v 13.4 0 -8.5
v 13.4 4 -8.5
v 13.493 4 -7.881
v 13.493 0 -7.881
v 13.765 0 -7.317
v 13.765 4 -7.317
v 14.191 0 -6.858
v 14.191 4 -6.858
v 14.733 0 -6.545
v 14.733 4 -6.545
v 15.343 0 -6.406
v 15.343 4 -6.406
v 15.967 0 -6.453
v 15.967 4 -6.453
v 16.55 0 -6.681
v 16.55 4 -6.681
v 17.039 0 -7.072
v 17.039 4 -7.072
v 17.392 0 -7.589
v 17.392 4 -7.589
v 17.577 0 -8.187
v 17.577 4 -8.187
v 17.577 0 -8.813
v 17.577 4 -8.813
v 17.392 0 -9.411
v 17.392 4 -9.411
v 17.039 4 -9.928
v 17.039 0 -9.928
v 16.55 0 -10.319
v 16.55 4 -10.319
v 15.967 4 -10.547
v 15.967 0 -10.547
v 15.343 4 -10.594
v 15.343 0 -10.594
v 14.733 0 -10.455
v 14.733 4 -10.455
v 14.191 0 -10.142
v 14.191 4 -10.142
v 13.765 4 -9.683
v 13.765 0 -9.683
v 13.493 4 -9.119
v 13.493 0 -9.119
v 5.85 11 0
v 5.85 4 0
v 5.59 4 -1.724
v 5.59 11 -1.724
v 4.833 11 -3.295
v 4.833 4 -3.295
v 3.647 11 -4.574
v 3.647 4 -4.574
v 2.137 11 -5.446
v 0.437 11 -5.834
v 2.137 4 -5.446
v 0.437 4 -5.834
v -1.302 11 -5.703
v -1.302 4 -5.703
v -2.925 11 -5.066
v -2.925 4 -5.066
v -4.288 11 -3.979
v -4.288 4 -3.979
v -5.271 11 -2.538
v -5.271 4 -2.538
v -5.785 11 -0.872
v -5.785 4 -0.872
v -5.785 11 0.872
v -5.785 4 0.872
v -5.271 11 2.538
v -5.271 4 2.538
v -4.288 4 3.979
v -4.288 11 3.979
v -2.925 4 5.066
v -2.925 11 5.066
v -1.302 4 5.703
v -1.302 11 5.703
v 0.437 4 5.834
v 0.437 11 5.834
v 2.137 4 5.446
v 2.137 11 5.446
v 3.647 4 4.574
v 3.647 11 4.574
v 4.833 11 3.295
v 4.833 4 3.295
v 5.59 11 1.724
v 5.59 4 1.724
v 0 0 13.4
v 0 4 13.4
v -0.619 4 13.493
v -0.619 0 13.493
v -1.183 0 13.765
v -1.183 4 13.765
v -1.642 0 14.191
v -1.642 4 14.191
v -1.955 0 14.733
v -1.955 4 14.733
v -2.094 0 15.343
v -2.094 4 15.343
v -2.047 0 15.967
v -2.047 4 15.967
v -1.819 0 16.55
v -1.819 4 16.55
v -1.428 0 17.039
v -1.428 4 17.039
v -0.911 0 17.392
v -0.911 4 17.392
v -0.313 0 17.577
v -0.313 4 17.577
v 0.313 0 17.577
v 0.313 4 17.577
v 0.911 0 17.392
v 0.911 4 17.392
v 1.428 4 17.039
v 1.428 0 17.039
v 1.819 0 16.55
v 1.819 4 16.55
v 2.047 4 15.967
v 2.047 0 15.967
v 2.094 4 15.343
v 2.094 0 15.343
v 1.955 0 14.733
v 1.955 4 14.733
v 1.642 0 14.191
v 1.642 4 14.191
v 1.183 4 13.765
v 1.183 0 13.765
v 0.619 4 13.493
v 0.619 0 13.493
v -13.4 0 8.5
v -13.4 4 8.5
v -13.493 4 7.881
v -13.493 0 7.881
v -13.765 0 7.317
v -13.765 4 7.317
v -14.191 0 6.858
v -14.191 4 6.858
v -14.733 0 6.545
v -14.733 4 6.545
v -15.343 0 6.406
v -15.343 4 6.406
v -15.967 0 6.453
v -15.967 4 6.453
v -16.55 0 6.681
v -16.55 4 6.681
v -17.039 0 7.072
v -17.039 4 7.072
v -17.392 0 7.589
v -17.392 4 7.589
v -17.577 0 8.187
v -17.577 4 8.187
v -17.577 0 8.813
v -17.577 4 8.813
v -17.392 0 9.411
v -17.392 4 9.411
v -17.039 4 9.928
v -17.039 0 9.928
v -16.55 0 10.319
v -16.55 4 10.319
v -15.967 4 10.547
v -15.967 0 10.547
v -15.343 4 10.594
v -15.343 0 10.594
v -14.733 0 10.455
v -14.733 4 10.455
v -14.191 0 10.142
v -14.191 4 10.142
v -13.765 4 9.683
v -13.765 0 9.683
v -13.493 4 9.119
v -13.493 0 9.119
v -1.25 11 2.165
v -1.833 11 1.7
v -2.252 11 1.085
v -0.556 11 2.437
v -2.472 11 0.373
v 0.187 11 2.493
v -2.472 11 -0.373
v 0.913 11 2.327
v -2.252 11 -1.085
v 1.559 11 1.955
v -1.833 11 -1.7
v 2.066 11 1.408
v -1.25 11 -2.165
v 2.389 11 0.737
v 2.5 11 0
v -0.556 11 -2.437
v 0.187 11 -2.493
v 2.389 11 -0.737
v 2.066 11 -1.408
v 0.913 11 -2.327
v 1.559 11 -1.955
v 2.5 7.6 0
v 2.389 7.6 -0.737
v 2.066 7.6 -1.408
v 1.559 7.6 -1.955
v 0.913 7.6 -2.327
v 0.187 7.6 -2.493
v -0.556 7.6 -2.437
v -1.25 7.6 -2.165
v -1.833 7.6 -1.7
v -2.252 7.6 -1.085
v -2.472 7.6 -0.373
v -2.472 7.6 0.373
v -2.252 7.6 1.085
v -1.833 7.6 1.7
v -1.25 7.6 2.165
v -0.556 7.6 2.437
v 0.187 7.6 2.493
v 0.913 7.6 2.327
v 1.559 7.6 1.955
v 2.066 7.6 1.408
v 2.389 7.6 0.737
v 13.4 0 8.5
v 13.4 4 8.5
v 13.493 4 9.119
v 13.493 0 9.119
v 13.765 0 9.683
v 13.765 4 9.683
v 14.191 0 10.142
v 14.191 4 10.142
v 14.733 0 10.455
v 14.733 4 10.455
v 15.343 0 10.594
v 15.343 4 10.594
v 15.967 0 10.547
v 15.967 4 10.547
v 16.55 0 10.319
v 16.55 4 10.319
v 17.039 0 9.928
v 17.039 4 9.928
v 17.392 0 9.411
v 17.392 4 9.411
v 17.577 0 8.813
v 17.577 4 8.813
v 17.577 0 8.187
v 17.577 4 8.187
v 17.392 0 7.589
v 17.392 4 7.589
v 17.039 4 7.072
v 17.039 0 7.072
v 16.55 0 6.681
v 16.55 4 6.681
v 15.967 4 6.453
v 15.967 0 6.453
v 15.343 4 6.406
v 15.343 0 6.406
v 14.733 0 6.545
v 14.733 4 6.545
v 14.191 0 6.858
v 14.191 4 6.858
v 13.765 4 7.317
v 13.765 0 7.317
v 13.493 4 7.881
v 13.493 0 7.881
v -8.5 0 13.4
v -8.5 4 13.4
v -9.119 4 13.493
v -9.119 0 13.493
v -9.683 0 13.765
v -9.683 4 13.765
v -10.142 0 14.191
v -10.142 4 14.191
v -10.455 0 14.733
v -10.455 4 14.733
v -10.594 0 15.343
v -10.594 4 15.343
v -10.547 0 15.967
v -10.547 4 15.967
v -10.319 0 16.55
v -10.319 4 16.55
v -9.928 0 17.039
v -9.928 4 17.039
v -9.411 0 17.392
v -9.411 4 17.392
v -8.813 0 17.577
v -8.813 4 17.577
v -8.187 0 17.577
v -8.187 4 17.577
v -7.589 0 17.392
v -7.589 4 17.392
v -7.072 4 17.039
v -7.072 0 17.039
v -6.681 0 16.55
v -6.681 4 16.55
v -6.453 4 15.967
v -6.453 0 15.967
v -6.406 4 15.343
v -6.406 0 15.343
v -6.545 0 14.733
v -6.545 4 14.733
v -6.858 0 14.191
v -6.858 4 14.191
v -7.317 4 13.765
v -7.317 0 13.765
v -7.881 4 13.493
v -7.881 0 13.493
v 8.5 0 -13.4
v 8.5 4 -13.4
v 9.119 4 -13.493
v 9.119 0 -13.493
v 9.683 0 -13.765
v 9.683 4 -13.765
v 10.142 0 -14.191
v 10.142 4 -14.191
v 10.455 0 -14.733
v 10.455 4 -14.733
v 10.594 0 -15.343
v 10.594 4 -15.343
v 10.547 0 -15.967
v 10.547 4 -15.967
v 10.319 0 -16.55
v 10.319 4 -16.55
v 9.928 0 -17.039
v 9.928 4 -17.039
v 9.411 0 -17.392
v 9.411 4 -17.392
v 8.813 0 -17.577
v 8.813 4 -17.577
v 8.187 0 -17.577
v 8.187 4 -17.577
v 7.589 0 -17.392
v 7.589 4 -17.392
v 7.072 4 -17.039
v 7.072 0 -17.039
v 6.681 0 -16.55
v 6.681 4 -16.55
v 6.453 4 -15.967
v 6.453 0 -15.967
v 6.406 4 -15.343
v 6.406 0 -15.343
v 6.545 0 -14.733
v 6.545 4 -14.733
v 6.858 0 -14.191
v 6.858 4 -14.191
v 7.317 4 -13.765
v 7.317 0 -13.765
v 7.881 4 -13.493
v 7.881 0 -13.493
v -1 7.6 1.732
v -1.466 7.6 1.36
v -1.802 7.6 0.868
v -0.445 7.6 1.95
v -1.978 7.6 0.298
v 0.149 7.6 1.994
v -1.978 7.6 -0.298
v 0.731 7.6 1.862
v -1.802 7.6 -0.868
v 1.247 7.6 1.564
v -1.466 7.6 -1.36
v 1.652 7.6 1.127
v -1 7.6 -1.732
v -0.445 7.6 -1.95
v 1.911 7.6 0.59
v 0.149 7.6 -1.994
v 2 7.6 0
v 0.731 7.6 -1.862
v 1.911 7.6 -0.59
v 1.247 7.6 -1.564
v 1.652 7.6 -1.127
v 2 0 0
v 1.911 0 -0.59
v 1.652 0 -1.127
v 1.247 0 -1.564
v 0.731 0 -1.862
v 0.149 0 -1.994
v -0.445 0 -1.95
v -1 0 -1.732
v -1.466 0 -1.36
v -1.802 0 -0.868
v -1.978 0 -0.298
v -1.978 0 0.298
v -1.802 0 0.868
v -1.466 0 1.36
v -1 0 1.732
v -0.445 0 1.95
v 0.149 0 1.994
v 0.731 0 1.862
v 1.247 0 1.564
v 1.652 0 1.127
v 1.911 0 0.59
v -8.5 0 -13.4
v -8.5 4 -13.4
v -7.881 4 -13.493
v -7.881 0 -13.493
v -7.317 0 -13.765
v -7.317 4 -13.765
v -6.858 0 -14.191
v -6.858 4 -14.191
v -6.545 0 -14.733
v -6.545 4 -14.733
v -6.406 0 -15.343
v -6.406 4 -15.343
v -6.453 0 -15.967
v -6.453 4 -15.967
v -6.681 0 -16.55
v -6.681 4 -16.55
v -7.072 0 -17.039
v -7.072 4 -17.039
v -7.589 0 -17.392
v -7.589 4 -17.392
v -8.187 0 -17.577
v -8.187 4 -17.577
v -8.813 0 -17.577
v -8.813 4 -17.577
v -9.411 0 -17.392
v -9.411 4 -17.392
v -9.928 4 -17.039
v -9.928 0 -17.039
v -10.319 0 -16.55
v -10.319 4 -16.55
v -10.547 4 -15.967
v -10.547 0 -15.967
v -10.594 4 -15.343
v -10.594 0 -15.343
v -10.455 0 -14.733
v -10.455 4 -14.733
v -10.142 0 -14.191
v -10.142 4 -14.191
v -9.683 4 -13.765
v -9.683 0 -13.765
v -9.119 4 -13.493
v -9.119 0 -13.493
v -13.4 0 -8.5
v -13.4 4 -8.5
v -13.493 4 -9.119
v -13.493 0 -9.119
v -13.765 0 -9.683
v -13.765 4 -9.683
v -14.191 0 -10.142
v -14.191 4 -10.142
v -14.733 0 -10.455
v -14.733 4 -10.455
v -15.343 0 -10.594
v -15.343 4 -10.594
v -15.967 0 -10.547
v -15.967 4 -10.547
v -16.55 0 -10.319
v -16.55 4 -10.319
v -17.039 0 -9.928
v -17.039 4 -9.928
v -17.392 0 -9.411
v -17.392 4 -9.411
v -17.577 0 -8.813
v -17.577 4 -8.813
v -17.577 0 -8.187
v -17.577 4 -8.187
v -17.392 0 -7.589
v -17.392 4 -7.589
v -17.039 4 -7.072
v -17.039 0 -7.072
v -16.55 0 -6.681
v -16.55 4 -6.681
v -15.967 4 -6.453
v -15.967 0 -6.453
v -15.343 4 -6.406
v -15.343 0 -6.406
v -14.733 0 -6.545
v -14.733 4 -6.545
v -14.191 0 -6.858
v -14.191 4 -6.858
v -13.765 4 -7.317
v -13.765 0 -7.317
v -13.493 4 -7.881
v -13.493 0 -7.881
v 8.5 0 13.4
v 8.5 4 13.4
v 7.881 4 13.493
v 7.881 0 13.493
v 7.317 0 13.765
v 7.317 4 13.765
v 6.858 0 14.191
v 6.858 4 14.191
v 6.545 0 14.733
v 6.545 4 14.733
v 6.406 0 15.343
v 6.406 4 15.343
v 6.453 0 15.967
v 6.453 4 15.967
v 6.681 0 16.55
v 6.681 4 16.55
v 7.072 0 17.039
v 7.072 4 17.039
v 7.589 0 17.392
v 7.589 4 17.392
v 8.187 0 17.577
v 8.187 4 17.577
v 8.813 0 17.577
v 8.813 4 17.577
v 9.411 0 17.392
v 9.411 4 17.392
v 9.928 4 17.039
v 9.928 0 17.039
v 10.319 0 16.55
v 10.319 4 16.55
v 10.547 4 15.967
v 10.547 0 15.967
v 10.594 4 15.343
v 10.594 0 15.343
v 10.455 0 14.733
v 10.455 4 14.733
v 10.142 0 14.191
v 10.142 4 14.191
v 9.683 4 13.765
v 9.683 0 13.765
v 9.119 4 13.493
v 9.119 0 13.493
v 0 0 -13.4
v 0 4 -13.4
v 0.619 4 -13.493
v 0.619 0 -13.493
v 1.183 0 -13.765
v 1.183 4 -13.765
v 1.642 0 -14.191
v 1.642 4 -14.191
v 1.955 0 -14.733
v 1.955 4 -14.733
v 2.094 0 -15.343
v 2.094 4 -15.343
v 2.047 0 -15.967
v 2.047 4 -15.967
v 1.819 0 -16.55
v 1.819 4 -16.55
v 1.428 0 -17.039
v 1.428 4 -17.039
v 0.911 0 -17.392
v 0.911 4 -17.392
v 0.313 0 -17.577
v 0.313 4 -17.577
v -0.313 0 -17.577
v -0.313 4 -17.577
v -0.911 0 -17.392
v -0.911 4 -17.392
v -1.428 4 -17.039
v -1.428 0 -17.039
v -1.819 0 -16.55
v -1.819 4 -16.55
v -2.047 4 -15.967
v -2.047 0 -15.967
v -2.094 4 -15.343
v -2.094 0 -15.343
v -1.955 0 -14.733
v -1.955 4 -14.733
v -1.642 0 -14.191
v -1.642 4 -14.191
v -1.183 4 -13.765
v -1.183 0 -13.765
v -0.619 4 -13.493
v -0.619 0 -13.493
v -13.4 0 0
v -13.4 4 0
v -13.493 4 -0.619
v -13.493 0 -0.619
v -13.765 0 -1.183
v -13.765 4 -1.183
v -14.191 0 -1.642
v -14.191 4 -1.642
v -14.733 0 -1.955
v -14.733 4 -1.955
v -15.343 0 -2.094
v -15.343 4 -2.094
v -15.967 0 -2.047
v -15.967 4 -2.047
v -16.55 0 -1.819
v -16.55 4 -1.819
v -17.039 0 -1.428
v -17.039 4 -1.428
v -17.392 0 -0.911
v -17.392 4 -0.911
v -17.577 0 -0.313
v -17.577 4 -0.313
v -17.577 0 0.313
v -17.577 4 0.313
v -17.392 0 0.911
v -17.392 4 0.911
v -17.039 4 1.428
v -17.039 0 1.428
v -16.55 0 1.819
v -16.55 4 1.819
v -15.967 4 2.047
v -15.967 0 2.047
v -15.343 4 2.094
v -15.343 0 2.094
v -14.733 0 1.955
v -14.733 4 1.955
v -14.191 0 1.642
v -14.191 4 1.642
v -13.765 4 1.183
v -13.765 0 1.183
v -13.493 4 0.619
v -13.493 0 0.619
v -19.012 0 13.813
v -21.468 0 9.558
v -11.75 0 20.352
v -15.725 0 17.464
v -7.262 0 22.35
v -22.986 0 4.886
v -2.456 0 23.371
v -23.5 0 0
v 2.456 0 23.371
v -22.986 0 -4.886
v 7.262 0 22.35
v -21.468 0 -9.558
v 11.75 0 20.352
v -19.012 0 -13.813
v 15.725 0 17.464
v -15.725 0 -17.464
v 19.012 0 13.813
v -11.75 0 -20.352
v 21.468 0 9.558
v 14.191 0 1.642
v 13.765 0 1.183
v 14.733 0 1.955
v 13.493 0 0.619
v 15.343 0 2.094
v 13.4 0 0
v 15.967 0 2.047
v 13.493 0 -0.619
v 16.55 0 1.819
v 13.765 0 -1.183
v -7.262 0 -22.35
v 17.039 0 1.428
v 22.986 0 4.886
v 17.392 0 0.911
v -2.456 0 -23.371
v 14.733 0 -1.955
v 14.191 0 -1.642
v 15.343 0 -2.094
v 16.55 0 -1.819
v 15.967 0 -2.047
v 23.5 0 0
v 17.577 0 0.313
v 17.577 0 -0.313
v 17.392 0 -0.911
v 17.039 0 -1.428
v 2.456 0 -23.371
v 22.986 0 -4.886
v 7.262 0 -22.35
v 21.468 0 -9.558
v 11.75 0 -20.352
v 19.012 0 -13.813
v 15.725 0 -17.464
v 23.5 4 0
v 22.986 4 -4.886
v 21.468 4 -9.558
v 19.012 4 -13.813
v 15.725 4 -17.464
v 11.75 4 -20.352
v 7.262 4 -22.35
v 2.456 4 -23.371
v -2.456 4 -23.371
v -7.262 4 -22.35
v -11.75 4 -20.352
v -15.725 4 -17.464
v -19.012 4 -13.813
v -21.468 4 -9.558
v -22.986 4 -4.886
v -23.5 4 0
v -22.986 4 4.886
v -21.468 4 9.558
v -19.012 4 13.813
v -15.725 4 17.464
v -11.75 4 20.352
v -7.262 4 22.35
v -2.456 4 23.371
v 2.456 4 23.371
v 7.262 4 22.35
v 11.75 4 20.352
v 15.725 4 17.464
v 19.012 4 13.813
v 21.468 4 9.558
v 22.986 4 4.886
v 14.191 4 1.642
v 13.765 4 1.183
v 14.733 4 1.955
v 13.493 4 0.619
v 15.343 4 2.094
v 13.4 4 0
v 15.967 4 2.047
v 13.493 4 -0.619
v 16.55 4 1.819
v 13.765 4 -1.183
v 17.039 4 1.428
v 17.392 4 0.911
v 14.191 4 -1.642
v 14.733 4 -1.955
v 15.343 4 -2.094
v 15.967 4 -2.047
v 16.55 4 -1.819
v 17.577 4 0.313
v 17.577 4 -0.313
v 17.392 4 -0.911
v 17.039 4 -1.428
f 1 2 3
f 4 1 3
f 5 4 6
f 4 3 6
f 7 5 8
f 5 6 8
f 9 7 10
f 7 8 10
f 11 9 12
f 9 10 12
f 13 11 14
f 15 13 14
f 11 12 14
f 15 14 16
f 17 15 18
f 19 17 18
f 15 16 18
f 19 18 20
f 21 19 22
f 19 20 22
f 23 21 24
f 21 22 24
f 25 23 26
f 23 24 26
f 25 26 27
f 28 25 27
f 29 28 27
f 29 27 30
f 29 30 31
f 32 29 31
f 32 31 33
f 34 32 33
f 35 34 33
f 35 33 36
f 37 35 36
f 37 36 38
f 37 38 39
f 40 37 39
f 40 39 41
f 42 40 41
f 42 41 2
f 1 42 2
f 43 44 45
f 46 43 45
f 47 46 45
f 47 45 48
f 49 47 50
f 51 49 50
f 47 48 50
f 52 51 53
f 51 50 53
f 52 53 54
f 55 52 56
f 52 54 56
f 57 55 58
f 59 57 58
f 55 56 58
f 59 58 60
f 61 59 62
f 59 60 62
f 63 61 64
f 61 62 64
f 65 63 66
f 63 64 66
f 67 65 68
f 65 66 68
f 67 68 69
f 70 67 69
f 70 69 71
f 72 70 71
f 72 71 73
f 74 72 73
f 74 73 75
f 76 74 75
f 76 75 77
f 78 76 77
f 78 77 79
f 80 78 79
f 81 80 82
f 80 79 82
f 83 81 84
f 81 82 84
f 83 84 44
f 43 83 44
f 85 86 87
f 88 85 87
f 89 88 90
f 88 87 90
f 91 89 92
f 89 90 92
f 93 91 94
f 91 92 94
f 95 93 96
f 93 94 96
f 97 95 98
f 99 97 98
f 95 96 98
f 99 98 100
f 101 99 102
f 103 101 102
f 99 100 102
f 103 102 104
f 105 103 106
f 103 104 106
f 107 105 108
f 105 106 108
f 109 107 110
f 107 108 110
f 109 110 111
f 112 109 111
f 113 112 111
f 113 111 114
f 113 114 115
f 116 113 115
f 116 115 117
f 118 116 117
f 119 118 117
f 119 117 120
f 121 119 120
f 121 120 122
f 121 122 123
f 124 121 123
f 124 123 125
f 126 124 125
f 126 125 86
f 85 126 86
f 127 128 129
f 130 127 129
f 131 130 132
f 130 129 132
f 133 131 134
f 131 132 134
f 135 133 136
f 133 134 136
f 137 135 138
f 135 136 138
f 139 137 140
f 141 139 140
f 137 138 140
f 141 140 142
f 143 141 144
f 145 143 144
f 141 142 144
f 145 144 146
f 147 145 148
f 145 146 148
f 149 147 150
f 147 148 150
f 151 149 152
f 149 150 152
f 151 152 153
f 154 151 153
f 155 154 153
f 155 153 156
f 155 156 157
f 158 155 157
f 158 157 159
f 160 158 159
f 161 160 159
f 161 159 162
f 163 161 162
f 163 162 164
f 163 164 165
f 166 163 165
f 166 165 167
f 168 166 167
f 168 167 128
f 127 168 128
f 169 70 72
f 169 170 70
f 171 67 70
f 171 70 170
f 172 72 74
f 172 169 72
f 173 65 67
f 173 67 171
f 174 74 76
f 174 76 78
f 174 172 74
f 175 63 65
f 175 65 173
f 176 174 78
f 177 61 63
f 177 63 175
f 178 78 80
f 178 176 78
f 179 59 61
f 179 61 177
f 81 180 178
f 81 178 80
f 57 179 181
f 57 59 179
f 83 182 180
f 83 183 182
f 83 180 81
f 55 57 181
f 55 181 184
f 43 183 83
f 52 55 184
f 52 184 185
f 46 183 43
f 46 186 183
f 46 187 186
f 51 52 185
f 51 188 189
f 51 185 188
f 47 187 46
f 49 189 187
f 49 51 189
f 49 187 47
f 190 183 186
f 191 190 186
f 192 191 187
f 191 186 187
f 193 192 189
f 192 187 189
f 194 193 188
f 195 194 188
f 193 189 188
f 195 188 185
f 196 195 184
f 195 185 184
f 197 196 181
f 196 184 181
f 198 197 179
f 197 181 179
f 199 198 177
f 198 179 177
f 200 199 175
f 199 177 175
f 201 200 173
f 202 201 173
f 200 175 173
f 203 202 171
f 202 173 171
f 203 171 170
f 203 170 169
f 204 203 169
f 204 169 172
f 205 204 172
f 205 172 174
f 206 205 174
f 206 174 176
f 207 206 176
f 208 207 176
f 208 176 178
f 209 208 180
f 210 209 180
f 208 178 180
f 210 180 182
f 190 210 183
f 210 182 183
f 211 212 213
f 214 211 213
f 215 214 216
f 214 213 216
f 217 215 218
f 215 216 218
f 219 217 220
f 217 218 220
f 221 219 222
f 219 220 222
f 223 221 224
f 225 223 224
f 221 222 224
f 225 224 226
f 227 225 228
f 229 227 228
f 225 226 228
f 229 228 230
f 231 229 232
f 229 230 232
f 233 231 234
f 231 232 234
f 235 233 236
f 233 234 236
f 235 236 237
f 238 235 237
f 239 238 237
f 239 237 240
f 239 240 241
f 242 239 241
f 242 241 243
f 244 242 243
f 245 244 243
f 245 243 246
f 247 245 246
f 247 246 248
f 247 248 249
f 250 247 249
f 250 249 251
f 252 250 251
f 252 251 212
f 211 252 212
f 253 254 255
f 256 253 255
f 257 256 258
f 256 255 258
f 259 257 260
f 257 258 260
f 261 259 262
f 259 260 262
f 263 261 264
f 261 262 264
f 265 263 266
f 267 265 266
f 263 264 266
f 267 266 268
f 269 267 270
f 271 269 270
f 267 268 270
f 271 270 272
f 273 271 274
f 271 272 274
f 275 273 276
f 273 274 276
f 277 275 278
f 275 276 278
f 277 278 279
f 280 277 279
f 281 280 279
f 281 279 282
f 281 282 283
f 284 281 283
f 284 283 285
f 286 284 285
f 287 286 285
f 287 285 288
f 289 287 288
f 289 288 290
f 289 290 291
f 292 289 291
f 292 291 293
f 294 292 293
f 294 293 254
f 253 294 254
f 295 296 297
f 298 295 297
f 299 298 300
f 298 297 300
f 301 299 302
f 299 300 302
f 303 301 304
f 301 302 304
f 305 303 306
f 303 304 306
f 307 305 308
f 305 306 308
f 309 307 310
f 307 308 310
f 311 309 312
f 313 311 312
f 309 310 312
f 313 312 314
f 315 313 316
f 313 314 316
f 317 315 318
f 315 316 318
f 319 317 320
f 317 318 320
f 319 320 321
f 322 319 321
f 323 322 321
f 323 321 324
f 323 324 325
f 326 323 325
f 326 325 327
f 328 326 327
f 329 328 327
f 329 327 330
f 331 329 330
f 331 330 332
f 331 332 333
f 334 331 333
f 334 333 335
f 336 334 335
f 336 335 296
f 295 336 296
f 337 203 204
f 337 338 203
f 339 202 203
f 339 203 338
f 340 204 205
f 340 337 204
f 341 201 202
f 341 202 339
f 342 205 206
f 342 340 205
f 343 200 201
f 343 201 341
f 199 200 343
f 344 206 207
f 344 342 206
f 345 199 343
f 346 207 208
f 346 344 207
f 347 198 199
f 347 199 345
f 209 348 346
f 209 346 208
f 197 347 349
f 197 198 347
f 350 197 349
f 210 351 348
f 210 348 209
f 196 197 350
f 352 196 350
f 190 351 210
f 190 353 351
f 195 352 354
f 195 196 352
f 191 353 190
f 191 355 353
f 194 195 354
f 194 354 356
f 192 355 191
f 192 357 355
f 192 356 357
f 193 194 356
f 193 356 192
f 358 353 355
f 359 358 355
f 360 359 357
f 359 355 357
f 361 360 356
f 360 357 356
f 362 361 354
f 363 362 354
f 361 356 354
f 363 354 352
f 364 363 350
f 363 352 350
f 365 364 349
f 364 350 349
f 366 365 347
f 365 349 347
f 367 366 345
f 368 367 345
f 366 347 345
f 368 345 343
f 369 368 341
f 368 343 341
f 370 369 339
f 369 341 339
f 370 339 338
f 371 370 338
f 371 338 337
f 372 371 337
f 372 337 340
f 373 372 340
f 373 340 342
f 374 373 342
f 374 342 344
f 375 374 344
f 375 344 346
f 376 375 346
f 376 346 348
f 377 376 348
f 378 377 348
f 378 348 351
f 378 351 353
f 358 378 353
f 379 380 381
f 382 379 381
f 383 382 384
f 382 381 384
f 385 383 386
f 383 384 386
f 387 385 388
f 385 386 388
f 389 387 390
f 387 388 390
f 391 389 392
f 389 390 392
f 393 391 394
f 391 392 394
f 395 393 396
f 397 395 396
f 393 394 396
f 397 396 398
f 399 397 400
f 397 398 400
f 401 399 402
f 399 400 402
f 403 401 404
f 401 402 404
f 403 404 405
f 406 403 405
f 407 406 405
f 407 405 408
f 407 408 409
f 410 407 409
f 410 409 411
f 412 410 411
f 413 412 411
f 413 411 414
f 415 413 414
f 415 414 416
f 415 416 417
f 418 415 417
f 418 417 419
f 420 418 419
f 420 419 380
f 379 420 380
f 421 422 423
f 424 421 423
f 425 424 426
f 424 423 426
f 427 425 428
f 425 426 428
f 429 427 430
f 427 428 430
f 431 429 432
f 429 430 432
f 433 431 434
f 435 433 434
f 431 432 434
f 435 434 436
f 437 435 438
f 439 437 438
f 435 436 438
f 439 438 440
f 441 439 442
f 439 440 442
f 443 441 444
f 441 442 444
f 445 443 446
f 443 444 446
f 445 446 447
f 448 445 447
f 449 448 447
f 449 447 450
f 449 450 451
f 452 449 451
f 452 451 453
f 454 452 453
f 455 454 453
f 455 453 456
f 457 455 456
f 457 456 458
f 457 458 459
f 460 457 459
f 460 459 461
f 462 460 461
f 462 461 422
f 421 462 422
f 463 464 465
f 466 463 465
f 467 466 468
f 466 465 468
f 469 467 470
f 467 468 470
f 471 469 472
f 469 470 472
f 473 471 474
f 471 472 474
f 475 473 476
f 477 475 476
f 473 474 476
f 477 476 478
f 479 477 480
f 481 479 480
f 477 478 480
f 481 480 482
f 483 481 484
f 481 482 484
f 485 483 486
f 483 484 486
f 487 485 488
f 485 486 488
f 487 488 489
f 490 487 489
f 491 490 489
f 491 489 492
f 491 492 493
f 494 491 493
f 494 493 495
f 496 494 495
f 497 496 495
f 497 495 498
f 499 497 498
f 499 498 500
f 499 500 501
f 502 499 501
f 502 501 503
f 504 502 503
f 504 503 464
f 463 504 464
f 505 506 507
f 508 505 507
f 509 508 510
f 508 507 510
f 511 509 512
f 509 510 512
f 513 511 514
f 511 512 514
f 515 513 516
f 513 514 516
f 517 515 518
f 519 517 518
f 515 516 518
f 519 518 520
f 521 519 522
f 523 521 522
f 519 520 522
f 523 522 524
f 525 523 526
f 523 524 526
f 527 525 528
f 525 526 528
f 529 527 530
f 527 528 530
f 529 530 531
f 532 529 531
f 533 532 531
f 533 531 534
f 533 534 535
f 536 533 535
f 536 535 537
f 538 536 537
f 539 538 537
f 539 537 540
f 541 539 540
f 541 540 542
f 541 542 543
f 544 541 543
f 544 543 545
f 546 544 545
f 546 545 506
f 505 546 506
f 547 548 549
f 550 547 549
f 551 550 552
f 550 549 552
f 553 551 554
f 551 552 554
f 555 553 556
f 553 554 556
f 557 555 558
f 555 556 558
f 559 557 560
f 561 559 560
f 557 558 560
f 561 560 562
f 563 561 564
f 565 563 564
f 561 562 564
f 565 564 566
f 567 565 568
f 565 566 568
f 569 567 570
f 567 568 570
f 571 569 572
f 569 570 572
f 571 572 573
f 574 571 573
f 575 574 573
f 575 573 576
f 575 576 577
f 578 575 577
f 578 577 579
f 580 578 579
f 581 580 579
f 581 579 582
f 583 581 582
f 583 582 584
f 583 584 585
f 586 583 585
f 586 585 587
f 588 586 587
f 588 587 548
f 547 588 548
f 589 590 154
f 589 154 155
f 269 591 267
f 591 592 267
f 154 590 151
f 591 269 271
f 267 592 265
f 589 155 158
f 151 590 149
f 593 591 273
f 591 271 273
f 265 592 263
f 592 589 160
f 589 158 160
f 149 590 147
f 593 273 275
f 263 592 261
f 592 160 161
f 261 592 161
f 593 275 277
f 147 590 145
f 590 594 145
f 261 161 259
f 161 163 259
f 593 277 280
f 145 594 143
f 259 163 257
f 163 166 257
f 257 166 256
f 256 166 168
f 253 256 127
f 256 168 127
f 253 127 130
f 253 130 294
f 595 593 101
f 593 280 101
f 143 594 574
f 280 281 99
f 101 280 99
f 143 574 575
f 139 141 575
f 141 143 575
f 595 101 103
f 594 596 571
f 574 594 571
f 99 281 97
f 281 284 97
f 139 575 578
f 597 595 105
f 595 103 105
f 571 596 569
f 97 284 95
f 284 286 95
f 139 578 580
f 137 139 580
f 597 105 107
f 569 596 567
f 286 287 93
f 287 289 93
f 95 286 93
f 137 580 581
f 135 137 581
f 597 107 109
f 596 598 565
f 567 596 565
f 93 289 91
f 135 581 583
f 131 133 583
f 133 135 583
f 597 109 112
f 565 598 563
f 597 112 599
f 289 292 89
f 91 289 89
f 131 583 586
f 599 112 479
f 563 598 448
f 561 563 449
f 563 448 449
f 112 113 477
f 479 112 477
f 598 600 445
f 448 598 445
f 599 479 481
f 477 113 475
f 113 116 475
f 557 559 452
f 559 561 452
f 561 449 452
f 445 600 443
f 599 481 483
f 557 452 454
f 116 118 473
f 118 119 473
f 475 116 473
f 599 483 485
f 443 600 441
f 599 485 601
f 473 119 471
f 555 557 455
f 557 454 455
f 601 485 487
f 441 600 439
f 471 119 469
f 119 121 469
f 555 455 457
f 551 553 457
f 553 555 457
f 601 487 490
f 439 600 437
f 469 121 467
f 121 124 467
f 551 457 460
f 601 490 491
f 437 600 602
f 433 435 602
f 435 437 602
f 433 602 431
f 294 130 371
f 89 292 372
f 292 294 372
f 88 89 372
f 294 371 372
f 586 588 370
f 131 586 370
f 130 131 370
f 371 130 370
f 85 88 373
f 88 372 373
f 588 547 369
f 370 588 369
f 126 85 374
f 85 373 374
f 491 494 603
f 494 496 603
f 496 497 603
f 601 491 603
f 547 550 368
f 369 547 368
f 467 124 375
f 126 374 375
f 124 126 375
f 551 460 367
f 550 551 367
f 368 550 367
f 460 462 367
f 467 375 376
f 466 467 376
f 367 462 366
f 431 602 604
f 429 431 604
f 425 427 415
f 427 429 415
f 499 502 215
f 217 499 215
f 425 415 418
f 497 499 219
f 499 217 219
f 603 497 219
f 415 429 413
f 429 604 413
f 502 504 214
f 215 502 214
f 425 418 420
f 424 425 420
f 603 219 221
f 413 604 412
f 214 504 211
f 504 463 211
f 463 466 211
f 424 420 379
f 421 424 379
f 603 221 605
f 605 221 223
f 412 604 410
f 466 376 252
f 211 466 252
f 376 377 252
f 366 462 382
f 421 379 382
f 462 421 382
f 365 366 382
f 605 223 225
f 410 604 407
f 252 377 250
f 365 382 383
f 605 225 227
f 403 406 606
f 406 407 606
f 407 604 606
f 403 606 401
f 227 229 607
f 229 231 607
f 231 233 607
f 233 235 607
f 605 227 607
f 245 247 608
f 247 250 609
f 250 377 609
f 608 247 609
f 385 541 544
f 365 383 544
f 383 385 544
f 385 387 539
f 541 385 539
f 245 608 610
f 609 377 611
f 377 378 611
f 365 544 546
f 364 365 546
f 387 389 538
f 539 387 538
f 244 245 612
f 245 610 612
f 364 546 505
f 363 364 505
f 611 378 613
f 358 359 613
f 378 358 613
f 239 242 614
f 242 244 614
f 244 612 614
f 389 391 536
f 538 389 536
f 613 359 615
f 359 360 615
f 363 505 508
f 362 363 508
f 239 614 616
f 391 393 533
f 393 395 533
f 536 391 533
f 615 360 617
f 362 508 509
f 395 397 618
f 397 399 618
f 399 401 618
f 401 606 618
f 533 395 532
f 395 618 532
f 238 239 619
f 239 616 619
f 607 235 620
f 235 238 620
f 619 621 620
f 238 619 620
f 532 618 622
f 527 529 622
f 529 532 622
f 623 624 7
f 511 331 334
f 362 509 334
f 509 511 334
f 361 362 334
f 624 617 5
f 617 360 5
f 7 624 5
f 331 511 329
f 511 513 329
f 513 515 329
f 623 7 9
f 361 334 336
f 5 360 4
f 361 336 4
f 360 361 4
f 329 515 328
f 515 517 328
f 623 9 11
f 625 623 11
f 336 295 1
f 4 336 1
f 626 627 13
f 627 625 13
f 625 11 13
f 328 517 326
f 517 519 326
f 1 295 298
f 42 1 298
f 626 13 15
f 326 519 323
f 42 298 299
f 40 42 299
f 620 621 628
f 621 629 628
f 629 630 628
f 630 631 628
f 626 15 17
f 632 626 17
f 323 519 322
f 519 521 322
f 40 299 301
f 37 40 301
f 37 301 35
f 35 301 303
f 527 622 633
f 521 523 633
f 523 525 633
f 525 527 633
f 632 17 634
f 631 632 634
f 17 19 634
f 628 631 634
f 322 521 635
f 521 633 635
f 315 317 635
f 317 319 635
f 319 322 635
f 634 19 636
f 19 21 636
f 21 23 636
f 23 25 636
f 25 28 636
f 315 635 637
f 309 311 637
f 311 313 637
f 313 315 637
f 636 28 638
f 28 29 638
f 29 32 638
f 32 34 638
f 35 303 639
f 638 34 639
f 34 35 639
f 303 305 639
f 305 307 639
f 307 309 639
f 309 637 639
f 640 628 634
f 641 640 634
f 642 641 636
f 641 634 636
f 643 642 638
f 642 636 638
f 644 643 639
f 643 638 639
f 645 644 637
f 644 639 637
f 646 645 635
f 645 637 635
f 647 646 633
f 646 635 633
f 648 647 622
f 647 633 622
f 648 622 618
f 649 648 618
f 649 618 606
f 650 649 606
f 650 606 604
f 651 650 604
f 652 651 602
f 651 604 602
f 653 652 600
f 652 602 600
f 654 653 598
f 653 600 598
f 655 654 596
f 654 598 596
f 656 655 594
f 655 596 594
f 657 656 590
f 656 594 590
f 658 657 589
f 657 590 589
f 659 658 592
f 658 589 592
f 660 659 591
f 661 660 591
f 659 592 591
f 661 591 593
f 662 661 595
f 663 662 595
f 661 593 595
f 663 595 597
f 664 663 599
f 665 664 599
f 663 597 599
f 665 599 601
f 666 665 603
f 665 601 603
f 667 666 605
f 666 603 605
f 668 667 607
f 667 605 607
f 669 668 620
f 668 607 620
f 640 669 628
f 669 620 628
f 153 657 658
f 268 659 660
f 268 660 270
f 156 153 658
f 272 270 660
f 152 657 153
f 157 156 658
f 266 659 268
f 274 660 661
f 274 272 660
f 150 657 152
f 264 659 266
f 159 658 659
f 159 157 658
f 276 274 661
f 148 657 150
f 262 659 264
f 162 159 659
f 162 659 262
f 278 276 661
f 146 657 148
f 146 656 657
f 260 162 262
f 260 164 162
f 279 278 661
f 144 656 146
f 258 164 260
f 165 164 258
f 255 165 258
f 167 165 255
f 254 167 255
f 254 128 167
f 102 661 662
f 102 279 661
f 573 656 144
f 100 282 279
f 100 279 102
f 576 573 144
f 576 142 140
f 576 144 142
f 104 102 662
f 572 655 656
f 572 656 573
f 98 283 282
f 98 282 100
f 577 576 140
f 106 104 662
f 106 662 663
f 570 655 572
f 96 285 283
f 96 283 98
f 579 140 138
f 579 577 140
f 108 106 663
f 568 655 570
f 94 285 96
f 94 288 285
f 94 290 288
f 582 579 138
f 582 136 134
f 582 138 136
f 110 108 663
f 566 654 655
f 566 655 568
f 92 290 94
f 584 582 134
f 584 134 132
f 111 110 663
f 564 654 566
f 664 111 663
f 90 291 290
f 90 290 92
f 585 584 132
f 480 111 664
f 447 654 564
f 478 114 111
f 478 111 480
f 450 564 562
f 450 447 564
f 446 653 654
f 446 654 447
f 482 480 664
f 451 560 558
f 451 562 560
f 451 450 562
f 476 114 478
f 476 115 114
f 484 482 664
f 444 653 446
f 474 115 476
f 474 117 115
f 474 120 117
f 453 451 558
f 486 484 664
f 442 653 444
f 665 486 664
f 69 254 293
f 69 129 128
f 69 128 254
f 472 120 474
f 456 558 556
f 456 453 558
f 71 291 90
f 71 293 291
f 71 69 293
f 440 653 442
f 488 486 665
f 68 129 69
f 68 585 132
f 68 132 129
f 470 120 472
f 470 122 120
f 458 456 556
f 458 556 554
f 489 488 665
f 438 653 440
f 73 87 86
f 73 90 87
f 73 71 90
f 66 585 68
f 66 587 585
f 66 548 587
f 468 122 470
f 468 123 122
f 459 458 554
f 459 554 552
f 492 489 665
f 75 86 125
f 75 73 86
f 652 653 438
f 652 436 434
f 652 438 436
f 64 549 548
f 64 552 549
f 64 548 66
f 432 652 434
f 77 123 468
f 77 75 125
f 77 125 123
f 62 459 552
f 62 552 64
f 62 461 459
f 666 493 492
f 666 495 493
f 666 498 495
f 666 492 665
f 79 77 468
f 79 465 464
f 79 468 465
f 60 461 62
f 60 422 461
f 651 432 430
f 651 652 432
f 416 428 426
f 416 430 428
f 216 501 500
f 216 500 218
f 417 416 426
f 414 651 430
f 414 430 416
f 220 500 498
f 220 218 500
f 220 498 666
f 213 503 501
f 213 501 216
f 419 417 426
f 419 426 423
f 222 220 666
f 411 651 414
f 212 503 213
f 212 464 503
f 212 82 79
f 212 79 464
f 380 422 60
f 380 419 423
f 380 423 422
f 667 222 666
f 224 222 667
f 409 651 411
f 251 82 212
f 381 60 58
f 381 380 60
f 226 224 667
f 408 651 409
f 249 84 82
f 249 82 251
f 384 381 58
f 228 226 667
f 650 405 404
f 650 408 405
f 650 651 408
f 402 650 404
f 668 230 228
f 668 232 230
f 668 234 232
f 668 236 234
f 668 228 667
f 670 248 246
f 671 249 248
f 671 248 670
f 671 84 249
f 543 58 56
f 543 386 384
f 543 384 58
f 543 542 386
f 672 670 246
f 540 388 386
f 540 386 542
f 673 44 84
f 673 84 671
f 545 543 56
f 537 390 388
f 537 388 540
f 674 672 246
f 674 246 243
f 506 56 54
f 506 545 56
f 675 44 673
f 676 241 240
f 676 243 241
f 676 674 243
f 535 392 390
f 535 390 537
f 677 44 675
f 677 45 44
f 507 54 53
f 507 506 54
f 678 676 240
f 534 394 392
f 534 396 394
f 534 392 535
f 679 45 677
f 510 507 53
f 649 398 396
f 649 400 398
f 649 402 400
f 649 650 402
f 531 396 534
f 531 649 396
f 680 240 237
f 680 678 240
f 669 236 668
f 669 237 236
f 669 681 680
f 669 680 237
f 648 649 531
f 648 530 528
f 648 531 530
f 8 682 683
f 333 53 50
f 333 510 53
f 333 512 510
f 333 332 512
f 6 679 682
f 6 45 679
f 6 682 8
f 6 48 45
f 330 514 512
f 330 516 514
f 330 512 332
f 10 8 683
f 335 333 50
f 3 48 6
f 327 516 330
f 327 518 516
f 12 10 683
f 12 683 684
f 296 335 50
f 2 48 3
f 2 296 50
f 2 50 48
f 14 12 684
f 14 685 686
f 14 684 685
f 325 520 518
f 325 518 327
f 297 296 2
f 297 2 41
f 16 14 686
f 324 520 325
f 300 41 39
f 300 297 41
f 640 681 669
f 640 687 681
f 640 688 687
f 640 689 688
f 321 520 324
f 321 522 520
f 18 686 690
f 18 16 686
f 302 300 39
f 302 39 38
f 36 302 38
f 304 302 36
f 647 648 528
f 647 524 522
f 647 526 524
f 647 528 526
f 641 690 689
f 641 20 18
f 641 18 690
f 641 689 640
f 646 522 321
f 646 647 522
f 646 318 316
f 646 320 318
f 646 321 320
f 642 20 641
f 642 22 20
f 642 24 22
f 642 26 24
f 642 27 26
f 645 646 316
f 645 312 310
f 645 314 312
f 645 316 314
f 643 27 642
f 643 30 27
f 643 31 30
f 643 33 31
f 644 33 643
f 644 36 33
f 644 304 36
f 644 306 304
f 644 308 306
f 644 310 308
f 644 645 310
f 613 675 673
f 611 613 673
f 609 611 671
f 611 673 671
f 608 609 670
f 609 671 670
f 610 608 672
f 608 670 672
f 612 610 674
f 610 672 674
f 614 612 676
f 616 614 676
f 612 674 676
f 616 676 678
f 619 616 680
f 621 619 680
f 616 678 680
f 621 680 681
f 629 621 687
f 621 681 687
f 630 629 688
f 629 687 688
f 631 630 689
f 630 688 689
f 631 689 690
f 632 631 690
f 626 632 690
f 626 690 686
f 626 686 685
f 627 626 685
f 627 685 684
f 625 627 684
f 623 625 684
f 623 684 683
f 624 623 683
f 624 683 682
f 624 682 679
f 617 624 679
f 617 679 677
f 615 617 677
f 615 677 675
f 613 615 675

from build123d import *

# Parameters (mm, degrees)
SKETCH_1_R               = 23.5
EXTRUDE_1_DEPTH          = 4
SKETCH_2_R               = 5.85
EXTRUDE_2_DEPTH          = 7
SKETCH_3_R               = 2.5
CUT_EXTRUDE_1_DEPTH      = 3.4
SKETCH_4_R               = 2.1
CUT_EXTRUDE_2_DEPTH      = 5
PATTERN_CIRCULAR_1_COUNT = 4
SKETCH_5_R               = 2
CUT_EXTRUDE_3_DEPTH      = 8.6


with BuildPart() as part:
    # 草圖1 → 填料-伸長1 (new body)
    with BuildSketch(Plane(origin=(0, 0, 0), x_dir=(1, 0, 0), z_dir=(0, 1, 0))):
        Circle(SKETCH_1_R)
    extrude(amount=EXTRUDE_1_DEPTH)

    # 草圖2 → 填料-伸長2 (add)
    with BuildSketch(Plane(origin=(0, 4, 0), x_dir=(1, 0, 0), z_dir=(0, 1, 0))):
        Circle(SKETCH_2_R)
    extrude(amount=EXTRUDE_2_DEPTH)

    # 草圖3 → 除料-伸長1 (cut)
    with BuildSketch(Plane(origin=(0, 11, 0), x_dir=(1, 0, 0), z_dir=(0, 1, 0))):
        Circle(SKETCH_3_R)
    extrude(amount=-CUT_EXTRUDE_1_DEPTH, mode=Mode.SUBTRACT)

    # 草圖4 → 除料-伸長2 (cut, through all)
    with BuildSketch(Plane(origin=(0, 4, 0), x_dir=(1, 0, 0), z_dir=(0, 1, 0))):
        with Locations((-15.5, 0)):
            Circle(SKETCH_4_R)
        with Locations((-15.5, 8.5)):
            Circle(SKETCH_4_R)
        with Locations((-15.5, -8.5)):
            Circle(SKETCH_4_R)
    cut_extrude_2 = extrude(amount=-CUT_EXTRUDE_2_DEPTH, mode=Mode.SUBTRACT)

    # 環狀複製排列1: 除料-伸長2 ×4 about axis
    pattern_circular_1_axis = Axis((0, 0, 0), (0, 1, 0))
    for i in range(1, PATTERN_CIRCULAR_1_COUNT):
        add(cut_extrude_2.rotate(pattern_circular_1_axis, i * 360 / PATTERN_CIRCULAR_1_COUNT), mode=Mode.SUBTRACT)

    # 草圖5 → 除料-伸長3 (cut, through all)
    with BuildSketch(Plane(origin=(0, 7.6, 0), x_dir=(1, 0, 0), z_dir=(0, 1, 0))):
        Circle(SKETCH_5_R)
    extrude(amount=-CUT_EXTRUDE_3_DEPTH, mode=Mode.SUBTRACT)


solid = part.part
